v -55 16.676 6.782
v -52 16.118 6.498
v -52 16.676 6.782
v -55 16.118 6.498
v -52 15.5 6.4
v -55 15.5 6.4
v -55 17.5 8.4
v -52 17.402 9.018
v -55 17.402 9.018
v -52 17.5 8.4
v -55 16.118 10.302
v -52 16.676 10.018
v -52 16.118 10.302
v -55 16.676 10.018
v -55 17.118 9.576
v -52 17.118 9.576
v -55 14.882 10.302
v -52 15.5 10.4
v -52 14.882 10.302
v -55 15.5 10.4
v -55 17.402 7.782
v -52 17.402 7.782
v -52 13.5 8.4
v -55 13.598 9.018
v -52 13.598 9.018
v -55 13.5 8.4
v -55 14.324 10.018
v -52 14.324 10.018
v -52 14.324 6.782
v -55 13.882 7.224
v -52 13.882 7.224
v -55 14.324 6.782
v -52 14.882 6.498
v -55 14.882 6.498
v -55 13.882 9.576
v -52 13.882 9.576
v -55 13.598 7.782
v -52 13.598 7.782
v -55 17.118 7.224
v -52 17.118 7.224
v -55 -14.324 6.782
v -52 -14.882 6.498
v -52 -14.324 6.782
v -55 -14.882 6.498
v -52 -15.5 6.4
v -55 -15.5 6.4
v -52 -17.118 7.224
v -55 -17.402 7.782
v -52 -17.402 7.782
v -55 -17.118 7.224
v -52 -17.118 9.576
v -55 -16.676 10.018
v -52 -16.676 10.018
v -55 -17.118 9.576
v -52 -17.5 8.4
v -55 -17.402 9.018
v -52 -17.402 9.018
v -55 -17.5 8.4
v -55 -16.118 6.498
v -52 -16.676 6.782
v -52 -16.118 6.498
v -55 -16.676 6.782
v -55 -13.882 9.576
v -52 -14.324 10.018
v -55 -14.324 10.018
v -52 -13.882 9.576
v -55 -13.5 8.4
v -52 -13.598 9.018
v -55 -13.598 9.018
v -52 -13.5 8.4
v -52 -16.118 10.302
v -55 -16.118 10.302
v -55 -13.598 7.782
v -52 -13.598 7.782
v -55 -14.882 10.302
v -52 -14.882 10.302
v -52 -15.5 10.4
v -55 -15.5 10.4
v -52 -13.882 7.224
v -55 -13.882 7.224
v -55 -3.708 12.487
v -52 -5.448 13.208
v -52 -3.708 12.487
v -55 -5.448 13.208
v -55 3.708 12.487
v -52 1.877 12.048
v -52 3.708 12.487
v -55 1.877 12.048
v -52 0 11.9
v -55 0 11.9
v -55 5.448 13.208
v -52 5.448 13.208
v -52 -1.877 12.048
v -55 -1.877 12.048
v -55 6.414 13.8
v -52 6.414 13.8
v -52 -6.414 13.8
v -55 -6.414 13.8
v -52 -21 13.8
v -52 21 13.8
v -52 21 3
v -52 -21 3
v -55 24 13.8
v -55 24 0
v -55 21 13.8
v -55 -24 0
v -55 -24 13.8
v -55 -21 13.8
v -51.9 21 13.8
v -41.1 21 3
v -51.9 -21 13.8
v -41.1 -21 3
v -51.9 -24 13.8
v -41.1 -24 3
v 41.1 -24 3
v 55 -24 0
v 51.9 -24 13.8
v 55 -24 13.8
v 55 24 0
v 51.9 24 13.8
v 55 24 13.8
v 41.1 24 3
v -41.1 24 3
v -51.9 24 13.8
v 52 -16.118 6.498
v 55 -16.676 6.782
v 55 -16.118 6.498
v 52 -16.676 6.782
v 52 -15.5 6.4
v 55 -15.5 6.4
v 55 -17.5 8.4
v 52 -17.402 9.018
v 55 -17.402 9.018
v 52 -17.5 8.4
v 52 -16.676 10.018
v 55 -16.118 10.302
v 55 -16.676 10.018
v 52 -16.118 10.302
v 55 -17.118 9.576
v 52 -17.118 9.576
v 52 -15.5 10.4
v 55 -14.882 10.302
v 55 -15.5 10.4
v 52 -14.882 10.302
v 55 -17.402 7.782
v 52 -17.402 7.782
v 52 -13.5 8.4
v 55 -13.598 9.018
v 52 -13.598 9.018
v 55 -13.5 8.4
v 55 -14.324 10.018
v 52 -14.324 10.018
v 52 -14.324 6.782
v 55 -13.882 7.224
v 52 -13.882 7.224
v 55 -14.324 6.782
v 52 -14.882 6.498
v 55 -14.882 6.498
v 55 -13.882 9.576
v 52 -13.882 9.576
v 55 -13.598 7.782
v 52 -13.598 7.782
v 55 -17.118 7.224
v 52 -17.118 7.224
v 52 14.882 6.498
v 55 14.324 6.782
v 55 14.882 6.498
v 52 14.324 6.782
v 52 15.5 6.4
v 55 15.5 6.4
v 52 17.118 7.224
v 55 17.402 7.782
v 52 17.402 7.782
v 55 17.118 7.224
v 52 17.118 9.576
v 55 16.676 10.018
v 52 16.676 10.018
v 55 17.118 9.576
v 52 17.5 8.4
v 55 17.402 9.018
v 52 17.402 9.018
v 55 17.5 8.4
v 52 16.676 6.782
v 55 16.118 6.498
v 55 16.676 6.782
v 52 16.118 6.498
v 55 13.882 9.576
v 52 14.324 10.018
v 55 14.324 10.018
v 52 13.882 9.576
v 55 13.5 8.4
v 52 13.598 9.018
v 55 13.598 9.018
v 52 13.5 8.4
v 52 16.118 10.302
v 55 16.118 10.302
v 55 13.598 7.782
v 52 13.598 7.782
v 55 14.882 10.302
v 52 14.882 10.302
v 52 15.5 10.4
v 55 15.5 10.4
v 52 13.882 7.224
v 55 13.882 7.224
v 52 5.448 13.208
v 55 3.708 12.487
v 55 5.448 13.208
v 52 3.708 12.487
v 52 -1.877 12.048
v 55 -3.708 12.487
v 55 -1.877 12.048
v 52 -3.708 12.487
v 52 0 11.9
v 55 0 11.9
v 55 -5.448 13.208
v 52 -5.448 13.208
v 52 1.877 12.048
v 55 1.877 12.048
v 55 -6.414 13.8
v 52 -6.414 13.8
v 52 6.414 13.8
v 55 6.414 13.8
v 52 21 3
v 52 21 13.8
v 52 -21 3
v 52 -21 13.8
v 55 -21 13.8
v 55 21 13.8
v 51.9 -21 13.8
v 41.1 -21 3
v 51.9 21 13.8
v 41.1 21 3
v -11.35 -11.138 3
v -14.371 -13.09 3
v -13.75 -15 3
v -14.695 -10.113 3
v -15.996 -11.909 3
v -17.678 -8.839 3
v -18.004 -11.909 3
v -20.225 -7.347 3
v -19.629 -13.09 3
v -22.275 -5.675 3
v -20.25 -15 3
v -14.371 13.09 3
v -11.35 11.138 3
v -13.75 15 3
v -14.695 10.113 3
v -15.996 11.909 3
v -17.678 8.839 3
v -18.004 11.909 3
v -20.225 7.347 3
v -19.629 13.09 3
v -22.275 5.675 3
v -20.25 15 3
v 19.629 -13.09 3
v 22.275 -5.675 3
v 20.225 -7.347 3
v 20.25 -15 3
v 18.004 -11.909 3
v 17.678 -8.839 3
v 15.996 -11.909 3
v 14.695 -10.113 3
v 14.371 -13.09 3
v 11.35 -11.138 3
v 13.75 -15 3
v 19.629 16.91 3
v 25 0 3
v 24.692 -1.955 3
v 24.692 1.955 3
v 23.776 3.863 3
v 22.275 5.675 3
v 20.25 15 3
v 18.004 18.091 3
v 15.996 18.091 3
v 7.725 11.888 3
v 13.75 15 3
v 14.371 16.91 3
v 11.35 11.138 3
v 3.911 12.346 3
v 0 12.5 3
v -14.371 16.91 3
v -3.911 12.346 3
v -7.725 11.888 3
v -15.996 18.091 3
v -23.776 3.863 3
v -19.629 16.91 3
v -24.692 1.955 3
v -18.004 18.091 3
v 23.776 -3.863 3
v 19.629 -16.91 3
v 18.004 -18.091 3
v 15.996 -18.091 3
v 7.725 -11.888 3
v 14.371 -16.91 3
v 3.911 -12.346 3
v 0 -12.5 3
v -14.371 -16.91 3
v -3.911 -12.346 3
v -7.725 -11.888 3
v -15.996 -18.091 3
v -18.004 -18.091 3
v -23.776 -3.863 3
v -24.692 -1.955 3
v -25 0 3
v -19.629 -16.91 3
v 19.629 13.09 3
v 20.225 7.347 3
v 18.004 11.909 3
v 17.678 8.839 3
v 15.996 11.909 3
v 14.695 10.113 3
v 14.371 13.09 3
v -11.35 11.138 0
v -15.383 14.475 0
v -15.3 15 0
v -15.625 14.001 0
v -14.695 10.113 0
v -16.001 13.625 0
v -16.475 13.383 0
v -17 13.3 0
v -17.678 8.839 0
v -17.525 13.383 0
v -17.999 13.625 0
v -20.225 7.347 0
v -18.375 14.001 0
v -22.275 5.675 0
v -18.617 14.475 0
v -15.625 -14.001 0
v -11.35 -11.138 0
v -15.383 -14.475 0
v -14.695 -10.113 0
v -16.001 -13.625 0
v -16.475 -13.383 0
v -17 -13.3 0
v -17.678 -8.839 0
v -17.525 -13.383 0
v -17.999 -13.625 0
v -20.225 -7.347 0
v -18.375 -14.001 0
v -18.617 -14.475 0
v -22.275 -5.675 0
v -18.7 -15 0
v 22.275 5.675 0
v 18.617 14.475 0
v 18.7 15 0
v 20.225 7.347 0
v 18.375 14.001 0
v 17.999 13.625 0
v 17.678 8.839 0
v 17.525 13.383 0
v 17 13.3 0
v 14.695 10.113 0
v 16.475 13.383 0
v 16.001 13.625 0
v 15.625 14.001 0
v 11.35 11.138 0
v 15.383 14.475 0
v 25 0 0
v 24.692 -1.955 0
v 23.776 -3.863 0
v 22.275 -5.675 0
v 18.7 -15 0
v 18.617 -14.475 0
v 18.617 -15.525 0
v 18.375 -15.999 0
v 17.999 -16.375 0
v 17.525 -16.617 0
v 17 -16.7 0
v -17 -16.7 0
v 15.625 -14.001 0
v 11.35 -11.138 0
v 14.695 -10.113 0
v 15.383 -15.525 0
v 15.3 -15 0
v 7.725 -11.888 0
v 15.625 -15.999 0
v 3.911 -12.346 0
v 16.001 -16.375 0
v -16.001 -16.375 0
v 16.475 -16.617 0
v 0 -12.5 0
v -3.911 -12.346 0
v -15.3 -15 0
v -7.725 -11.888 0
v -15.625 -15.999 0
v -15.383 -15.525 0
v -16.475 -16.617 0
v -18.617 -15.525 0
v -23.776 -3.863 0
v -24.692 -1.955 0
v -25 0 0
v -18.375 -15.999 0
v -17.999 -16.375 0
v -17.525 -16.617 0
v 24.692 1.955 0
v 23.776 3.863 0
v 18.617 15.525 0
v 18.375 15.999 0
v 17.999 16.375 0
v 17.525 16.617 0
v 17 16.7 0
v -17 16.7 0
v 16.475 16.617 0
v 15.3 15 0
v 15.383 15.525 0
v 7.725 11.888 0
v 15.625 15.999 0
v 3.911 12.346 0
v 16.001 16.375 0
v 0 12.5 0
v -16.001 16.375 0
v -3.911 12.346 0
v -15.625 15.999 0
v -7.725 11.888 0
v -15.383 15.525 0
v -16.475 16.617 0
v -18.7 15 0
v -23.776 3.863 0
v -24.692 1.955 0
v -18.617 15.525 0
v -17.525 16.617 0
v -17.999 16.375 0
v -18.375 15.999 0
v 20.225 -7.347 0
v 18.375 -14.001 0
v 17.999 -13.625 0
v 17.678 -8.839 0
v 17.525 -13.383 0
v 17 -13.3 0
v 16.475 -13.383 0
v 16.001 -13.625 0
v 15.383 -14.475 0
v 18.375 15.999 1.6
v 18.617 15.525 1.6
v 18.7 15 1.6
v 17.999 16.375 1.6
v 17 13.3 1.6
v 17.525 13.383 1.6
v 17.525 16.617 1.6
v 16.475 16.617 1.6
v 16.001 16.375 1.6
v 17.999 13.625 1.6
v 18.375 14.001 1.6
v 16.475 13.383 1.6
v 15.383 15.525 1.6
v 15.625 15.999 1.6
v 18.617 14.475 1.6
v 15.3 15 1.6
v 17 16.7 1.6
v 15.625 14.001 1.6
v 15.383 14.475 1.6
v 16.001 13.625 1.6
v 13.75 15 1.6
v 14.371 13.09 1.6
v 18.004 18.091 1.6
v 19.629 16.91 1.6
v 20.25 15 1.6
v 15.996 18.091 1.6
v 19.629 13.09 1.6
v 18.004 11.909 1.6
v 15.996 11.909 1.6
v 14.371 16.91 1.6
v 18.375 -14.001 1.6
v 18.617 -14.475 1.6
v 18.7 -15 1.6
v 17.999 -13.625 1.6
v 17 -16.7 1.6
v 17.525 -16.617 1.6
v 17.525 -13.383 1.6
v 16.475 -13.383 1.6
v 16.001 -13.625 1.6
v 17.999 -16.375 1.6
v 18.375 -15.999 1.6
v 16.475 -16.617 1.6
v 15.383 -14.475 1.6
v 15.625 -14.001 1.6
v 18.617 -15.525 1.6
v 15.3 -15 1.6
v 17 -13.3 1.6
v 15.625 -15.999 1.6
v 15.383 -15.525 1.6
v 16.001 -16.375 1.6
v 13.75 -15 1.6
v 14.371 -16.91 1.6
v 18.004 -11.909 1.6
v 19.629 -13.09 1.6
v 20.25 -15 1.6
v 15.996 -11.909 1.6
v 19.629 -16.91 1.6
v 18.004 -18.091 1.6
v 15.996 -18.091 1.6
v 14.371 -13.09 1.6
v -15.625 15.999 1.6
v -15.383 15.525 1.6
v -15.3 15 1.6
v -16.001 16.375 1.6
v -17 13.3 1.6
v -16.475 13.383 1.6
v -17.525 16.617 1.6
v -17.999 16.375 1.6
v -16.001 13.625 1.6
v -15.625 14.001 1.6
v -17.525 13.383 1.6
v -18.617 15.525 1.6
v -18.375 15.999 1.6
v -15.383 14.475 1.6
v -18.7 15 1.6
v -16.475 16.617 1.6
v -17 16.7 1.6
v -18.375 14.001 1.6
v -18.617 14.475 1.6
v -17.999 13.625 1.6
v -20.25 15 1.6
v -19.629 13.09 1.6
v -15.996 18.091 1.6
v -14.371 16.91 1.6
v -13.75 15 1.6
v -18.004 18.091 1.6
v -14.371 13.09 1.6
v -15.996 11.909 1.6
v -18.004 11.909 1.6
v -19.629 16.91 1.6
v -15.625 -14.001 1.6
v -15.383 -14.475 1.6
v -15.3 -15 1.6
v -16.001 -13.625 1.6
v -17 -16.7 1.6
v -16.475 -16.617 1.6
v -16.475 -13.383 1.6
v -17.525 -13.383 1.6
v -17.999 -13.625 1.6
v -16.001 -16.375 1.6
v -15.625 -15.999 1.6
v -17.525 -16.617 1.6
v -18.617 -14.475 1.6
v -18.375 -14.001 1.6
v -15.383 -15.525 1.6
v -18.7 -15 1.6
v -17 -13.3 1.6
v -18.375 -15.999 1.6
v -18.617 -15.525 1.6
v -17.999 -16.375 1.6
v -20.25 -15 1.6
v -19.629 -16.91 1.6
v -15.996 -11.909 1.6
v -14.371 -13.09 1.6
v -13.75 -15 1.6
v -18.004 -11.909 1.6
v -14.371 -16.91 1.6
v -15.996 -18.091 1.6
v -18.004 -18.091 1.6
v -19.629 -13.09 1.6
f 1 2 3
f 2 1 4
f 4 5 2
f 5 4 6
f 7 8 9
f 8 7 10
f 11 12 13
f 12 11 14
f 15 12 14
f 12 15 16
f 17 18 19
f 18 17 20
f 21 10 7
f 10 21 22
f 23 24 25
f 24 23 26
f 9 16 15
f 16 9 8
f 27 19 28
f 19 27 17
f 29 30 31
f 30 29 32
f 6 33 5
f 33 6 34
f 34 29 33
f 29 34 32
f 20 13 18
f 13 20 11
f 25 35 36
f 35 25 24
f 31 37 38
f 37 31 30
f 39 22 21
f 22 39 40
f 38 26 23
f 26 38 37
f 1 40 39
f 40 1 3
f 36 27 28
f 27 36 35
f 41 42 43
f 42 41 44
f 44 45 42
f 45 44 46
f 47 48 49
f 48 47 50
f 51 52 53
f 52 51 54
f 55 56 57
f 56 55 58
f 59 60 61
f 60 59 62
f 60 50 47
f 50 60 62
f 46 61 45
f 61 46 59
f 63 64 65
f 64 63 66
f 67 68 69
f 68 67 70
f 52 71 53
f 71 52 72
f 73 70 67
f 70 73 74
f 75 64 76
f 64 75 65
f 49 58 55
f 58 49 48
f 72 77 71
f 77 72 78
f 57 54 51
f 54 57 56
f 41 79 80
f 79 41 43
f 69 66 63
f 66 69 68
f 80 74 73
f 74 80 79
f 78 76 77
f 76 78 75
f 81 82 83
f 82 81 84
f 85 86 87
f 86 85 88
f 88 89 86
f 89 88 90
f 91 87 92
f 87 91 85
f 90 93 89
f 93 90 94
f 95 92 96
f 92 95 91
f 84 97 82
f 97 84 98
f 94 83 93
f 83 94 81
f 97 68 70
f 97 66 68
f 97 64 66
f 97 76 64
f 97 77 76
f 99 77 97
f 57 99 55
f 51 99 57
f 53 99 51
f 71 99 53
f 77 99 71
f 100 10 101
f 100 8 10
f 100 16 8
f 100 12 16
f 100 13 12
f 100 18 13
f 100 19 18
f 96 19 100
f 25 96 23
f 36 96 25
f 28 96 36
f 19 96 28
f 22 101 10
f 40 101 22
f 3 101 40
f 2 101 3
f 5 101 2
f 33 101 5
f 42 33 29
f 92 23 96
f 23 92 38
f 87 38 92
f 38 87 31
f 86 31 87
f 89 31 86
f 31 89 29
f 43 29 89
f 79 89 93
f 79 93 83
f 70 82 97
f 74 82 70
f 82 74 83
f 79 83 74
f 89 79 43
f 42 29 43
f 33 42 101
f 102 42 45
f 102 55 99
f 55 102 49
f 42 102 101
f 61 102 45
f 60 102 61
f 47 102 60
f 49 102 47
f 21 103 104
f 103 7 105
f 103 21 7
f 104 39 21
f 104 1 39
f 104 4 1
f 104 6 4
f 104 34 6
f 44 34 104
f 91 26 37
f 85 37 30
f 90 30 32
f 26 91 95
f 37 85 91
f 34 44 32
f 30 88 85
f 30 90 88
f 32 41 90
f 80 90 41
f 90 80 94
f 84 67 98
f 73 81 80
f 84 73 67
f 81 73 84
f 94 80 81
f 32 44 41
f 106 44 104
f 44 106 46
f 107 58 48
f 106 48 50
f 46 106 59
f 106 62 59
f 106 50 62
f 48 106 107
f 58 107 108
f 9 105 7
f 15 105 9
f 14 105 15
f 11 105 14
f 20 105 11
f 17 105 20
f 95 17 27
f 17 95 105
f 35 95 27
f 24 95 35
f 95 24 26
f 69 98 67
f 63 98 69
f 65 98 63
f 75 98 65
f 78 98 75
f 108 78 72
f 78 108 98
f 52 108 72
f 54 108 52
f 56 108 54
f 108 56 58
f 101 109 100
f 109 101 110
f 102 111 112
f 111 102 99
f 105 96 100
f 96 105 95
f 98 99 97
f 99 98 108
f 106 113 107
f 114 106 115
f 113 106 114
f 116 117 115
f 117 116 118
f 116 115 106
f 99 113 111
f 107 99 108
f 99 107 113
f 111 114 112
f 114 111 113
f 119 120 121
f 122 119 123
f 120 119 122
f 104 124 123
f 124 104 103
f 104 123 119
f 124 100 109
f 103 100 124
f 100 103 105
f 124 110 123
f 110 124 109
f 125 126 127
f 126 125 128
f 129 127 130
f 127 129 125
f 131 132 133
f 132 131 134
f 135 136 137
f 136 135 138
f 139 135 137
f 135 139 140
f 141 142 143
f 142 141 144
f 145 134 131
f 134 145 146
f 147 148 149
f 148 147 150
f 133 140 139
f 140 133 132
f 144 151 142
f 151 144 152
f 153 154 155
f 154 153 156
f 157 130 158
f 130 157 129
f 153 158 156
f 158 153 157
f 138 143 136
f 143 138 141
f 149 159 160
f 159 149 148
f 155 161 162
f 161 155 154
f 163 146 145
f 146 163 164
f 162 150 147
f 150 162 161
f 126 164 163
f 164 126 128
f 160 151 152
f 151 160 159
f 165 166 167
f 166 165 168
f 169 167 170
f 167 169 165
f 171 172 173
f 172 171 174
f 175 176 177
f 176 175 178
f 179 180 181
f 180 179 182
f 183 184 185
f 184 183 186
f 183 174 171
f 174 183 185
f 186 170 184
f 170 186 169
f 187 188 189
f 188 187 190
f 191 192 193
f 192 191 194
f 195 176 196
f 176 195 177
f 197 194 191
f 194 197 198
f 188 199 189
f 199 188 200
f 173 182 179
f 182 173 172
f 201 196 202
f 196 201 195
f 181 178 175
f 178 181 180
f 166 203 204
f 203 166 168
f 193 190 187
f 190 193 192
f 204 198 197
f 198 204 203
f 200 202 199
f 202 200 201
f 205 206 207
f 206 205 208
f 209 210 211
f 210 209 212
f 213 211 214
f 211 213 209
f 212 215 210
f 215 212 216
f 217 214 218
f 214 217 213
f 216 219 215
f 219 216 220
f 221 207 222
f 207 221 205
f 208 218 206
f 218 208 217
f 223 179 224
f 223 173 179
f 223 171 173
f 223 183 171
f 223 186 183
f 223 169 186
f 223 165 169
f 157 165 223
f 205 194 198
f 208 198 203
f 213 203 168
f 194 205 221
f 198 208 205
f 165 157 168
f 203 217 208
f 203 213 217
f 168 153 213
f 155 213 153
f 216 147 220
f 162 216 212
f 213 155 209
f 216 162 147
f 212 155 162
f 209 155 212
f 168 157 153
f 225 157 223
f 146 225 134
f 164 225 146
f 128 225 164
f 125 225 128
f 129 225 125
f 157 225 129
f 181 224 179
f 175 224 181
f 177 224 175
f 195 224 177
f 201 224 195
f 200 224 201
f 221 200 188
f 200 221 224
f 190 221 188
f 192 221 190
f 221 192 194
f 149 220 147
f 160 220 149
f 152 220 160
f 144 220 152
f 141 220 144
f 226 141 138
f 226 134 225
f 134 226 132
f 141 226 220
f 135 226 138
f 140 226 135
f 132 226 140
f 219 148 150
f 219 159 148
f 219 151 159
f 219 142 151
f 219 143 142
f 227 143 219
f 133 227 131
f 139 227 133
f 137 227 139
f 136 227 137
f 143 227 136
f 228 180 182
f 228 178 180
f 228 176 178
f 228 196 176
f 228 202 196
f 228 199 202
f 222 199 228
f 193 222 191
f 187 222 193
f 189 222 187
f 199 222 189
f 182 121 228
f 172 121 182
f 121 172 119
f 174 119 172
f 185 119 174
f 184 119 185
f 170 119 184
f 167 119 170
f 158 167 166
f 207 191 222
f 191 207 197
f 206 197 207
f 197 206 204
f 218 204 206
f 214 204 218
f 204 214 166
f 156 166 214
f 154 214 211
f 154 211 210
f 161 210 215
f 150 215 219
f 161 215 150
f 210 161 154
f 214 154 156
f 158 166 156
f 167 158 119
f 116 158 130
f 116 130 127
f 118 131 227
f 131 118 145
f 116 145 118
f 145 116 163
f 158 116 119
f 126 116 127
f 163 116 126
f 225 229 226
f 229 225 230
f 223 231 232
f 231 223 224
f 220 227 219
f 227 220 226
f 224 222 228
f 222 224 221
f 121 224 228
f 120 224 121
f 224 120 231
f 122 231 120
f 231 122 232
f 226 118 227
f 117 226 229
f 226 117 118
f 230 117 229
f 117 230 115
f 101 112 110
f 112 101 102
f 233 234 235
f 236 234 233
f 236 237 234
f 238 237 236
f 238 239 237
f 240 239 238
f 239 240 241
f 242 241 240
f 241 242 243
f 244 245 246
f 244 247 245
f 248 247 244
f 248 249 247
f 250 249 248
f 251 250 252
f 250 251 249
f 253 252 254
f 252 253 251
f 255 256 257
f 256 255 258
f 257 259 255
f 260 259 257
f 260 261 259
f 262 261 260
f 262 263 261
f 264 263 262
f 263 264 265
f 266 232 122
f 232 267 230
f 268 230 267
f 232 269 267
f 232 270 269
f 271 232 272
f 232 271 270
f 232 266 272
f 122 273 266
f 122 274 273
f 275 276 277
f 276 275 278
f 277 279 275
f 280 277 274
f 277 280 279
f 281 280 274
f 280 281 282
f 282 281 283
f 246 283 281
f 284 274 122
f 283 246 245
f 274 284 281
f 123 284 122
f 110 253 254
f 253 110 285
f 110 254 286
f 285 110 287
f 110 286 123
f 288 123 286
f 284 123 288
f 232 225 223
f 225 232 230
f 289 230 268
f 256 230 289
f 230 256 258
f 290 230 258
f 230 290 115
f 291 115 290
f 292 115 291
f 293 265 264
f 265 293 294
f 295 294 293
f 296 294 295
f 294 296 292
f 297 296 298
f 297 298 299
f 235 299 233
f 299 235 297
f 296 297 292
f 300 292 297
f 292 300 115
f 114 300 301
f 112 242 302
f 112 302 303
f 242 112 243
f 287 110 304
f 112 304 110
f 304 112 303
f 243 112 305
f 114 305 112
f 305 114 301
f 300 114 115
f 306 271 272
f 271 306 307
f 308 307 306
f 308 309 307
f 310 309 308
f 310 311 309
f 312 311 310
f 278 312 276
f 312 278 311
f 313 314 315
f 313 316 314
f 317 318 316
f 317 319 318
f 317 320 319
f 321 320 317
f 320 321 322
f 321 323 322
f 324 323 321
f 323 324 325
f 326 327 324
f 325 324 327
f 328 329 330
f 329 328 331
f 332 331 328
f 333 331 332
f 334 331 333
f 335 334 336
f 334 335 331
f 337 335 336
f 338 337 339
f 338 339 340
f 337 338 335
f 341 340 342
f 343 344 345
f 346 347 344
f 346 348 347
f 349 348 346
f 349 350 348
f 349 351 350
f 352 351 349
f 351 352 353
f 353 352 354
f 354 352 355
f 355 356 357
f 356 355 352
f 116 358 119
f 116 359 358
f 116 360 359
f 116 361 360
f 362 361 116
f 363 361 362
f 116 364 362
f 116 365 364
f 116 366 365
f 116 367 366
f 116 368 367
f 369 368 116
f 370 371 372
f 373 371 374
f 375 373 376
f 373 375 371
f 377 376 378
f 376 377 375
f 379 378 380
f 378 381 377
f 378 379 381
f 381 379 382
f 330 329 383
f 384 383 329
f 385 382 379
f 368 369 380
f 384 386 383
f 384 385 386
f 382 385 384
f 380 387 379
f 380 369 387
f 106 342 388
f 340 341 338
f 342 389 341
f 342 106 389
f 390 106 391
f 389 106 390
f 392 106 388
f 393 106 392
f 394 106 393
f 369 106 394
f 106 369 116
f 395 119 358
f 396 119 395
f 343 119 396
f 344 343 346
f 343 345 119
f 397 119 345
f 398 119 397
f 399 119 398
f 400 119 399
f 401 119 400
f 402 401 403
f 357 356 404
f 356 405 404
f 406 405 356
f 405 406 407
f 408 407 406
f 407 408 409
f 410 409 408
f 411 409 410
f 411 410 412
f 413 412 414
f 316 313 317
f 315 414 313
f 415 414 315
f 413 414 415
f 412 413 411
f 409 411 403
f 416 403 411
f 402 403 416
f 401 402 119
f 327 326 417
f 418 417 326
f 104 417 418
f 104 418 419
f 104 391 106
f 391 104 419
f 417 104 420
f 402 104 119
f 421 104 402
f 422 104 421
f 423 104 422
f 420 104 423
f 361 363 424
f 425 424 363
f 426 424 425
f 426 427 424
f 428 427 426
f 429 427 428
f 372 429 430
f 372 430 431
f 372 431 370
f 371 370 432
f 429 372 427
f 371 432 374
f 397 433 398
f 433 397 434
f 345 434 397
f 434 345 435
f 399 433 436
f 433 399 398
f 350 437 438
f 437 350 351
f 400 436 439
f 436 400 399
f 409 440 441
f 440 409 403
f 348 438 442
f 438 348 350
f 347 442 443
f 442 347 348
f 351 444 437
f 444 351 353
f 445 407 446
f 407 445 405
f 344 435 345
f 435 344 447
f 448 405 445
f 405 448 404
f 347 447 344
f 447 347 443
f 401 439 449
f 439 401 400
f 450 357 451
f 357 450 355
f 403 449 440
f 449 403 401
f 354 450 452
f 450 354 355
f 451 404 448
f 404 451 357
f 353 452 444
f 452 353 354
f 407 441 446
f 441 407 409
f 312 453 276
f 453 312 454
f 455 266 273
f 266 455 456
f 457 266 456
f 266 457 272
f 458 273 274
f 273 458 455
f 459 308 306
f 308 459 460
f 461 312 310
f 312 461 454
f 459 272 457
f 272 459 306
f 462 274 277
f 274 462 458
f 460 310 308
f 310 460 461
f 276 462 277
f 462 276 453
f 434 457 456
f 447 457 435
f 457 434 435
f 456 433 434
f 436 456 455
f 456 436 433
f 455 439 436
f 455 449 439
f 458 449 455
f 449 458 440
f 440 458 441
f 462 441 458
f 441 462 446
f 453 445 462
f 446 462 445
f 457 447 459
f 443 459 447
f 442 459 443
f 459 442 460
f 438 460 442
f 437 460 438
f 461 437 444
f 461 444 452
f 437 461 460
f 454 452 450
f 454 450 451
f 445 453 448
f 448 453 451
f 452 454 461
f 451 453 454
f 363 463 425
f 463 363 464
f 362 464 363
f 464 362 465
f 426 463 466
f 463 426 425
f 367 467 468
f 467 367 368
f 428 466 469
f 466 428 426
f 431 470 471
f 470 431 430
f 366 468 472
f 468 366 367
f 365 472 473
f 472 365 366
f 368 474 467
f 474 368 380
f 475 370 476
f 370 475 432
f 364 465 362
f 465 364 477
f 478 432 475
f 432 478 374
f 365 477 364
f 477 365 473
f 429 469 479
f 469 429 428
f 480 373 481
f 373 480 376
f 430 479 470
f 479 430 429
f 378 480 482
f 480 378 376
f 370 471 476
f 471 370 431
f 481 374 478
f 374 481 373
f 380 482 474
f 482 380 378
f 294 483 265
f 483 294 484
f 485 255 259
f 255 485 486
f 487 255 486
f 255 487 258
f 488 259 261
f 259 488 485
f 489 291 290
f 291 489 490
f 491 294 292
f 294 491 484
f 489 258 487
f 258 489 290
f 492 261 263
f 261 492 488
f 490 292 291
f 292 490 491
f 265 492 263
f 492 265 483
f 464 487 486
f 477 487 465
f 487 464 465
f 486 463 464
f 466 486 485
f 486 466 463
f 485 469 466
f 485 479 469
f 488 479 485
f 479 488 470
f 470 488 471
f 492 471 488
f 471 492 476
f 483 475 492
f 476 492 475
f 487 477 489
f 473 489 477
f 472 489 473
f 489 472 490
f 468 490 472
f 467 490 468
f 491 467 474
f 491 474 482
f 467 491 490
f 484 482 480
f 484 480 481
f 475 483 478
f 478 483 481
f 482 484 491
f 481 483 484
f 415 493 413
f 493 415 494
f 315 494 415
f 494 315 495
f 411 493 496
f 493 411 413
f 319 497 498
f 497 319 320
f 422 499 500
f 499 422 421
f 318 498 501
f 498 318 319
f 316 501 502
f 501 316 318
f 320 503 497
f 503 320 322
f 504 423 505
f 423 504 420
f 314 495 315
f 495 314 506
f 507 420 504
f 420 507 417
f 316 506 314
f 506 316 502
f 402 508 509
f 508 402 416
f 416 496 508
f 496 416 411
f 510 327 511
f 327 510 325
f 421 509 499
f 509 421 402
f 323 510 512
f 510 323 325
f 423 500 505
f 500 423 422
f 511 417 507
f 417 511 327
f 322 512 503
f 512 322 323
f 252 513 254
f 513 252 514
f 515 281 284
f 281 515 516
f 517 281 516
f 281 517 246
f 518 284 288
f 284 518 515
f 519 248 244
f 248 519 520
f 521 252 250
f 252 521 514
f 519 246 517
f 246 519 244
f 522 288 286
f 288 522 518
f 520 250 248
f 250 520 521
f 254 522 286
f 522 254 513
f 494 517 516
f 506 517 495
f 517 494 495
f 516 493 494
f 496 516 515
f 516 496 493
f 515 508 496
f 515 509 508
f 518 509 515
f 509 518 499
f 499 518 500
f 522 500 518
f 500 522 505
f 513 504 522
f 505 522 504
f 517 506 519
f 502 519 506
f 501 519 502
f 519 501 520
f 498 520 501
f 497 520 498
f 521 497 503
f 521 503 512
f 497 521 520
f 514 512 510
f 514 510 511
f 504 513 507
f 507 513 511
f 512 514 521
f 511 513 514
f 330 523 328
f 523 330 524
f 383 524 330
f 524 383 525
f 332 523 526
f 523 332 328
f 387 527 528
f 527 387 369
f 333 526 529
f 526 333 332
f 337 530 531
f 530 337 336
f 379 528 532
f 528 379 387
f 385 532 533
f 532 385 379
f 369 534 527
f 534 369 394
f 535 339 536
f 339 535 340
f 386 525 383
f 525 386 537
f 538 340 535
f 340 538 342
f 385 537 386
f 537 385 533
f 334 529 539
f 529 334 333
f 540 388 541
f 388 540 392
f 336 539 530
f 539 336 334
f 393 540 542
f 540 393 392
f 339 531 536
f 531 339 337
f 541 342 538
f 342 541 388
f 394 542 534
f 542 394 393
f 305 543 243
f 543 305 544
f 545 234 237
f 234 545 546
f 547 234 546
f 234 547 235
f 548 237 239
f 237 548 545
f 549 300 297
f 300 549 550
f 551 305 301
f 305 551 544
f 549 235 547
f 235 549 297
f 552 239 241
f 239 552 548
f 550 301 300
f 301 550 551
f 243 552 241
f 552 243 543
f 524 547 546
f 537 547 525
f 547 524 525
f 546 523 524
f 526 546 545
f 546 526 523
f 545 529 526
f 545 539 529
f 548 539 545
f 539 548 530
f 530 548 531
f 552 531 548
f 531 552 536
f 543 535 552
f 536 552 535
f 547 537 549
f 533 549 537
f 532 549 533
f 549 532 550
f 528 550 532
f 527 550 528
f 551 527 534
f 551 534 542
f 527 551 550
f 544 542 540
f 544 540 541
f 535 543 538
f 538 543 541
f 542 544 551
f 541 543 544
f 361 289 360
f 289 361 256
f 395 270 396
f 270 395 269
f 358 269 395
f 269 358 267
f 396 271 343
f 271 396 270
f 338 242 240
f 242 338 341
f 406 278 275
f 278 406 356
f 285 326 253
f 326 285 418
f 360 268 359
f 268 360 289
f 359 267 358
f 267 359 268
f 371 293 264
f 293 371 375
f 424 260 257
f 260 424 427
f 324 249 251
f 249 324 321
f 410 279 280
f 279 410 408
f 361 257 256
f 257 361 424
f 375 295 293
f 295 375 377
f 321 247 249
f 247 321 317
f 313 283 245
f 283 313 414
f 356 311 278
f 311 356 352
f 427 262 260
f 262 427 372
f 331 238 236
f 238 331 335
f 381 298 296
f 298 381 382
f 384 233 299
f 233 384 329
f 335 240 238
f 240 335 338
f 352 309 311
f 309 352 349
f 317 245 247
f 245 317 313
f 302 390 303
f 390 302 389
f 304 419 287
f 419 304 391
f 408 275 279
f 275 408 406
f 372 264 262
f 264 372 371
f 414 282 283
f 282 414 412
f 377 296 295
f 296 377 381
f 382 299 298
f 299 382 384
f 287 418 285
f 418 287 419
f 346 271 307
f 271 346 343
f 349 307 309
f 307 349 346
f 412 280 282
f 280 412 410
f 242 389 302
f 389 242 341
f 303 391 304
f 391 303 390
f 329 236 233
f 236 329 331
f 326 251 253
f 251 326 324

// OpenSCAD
// file: lib/stepper.scad
smWidth = 42;
smLength = 40;
smScrewHoleOffsets = 31/2;
smCenterDiameter = 22;
smExtra = 1;

module stepperMotor() {
    smCenterHeight = 2;
    smShaftDiameter = 5;
    smShaftLength = 23;
    smScrewDepth = 4.5;
    smScrewDiameter = 3;
    smEdgeTrimOffset = 27;
    module add() {
        translate([-smWidth/2, -smLength, -smWidth/2]) {
            cube([smWidth, smLength, smWidth]);
        }
        rotate([-90, 0, 0]) {
            cylinder(d=smCenterDiameter, h=smCenterHeight, $fn=30);
            cylinder(d=smShaftDiameter, h=smShaftLength, $fn=20);
        }
    }
    module del() {
        for (x = [smScrewHoleOffsets, -smScrewHoleOffsets]) {
            for (z = [smScrewHoleOffsets, -smScrewHoleOffsets]) {
                translate([x, iota, z]) {
                    rotate([90, 0, 0]) {
                        cylinder(d=smScrewDiameter, h=smScrewDepth, $fn=40);
                    }
                }
            }
        }
        for (a = [45, 135, 225, 315]) {
            rotate([0, a, 0]) {
                translate([smEdgeTrimOffset,
                        -smLength-iota, -smWidth/2-iota]) {
                    cube([smWidth, smLength+2*iota, smWidth+2*iota]);
                }
            }
        }

    }
    difference() {
        add();
        del();
    }
}

module stepperMotorHole() {
    smHoleHeight = 20;
    smScrewHoleDiameter = 4;

    widthPlusExtra = smWidth + smExtra;
    lengthPlusExtra = smLength + smExtra/2;

    translate([-smWidth/2, -lengthPlusExtra, -widthPlusExtra/2]) {
        cube([smWidth, lengthPlusExtra, widthPlusExtra]);
    }
    translate([0, -iota, 0]) {
        rotate([-90, 0, 0]) {
            cylinder(d=smCenterDiameter+smExtra, h=smHoleHeight, $fn=40);
        }
    }
    for (x = [smScrewHoleOffsets, -smScrewHoleOffsets]) {
        for (z = [smScrewHoleOffsets, -smScrewHoleOffsets]) {
            translate([x, smHoleHeight-iota, z]) {
                rotate([90, 0, 0]) {
                    cylinder(d=smScrewHoleDiameter, h=smHoleHeight, $fn=40);
                }
            }
        }
    }

}
// file: lib/commonConstants.scad
// A small quantity to keep parts from starting or ending at exactly the
// same location. For example when we create a hole through an object we
// want the object being subtracted to stick slightly past the object being
// subtracted from.
iota = 0.1;


// Length and hole diameter of the #4 x 3/8in Phillips mount screw.
screwLength = 9.3;
screwHoleDiameter = 2.75;
screwHeadDiameter = 6.5;
screwBodyDiameter = 3.4;


// These constants are the basic parameters of the mount plate. They are
// necessary for other components to make their calculations.
mountPlateWidth = 37.6;
mountPlateLength = 51;


// These constants are the basis for the carbon fiber mount points. They are
// necessary for other components to make their calculations.
mountRodDiameter = 5.5;         // A little extra because holes are smaller.
mountThickness = 9;
mountDiameter = mountRodDiameter + 2*mountThickness;


// These constasnts are teh basis for the motor base. They are necessary for
// other components to make their calculations.
motorBaseExtraAxisOffset = 5;
motorBaseTopOffset = sqrt(3)*mountPlateWidth/6 + motorBaseExtraAxisOffset;
motorBaseBottomOffset = mountPlateLength/sqrt(2) + motorBaseTopOffset;
motorBaseBottomRadius = sqrt(pow(motorBaseBottomOffset,2) +
                             pow(mountPlateWidth/2, 2));
mountBaseRodOffsets = motorBaseBottomRadius-mountDiameter/2;
// main file
include <lib/commonConstants.scad>;
include <lib/stepper.scad>;
include <lib/commonMounts.scad>;

twoWheelBaseTop();
